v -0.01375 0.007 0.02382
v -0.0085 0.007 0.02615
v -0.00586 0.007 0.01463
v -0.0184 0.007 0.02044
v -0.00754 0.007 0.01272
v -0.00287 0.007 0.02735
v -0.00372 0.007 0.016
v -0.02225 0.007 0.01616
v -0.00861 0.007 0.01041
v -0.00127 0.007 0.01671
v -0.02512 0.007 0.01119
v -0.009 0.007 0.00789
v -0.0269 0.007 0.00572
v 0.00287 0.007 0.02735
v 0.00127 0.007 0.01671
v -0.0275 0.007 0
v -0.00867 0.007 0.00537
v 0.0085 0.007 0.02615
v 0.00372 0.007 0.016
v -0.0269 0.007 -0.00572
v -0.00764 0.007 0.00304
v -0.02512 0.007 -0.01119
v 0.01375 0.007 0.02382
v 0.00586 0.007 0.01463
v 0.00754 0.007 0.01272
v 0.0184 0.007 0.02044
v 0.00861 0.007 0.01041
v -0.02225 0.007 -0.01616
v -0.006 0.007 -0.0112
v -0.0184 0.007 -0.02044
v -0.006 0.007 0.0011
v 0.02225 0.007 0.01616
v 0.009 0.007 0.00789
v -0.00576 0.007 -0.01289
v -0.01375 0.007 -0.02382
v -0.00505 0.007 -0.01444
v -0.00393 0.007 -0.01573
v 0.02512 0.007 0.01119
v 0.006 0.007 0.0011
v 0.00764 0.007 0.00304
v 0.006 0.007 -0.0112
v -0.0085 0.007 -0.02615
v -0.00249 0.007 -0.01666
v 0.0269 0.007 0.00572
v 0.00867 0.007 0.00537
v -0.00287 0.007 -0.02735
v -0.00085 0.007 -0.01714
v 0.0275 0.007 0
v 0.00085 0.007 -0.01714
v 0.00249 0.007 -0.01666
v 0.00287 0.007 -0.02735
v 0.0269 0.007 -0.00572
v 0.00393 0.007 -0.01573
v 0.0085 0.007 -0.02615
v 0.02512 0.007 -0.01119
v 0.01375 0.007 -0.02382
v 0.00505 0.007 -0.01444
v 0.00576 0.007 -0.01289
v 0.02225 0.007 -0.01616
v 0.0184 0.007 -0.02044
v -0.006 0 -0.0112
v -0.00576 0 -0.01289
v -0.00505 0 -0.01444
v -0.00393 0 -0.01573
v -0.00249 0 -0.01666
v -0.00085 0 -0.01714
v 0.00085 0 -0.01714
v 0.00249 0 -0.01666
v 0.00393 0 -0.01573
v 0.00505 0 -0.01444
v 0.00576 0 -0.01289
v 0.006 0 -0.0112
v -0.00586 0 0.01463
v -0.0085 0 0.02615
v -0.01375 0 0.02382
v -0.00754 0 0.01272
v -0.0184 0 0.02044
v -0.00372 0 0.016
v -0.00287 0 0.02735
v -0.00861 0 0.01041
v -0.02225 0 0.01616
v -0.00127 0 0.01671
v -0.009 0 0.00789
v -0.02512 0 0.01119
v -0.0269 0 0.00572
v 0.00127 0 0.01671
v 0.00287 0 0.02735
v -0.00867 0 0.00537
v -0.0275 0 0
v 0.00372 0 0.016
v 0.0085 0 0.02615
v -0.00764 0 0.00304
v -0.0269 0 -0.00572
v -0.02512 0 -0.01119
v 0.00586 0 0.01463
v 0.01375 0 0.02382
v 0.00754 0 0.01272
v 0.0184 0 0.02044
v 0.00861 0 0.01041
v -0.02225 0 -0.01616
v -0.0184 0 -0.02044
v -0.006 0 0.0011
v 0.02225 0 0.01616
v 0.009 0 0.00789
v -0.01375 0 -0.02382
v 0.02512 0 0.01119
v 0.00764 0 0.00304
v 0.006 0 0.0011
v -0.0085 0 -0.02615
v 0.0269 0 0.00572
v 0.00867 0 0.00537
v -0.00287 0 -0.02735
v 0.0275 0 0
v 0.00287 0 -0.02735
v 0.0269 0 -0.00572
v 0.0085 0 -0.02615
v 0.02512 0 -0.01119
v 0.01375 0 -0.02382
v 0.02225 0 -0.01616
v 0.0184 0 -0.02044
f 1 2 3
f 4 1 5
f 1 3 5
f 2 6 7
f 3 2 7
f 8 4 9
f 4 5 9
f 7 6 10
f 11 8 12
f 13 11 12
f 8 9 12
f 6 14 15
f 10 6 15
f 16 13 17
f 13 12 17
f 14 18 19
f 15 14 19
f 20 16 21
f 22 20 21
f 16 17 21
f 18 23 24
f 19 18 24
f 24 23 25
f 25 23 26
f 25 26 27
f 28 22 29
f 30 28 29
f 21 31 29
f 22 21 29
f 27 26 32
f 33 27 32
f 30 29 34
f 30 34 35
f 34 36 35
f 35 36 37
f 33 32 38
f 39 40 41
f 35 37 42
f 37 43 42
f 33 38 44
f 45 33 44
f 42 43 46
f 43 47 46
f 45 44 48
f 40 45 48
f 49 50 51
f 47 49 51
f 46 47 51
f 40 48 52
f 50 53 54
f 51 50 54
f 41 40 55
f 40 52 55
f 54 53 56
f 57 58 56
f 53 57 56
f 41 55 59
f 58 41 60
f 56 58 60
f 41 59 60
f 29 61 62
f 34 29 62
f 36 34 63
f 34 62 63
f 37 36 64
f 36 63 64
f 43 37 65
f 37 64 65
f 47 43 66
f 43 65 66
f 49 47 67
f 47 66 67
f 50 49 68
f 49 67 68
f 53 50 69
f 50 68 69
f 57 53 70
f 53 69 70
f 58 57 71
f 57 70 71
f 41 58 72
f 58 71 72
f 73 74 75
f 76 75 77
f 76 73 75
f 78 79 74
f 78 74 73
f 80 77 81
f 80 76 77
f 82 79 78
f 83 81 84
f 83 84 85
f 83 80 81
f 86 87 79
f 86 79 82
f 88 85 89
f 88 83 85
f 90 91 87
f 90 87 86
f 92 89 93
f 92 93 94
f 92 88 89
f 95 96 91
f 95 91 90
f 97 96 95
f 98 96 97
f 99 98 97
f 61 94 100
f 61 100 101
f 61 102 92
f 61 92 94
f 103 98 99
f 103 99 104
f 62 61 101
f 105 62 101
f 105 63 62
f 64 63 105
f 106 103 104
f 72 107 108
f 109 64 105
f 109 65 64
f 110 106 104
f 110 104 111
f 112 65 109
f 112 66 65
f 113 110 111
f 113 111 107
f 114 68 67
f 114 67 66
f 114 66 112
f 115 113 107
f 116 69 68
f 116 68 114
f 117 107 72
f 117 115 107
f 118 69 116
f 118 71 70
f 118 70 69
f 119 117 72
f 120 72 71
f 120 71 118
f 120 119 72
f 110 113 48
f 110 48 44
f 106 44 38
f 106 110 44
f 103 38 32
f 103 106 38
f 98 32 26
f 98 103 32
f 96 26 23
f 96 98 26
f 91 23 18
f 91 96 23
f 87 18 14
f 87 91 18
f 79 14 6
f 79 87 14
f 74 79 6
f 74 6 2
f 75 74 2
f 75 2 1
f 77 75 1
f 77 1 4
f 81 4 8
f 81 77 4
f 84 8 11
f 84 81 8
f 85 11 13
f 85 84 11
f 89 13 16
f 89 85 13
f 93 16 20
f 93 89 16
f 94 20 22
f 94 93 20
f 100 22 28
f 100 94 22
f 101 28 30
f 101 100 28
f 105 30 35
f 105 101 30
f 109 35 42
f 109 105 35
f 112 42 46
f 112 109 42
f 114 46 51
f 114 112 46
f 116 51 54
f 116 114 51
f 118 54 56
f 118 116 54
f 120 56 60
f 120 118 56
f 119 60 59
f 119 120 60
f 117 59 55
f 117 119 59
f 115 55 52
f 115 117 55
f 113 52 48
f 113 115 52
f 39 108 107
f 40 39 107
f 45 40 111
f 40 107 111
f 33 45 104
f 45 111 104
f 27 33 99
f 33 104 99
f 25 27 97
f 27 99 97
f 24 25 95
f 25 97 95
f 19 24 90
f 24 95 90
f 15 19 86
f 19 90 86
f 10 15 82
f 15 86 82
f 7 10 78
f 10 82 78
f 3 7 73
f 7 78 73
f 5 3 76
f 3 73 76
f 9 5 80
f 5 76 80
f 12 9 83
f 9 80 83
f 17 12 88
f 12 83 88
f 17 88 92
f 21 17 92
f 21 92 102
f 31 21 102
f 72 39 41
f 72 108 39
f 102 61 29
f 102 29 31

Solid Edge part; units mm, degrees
sketch "Sketch1" plane through (0, 0, 0) normal (0, -1, 0) x (1, 0, 0)
  circle A0 centre (0, 0) radius 0.0275
  line L0 (0.006, 0.0011) -> (0.006, -0.0112)
  arc A1 (-0.006, 0.0011) -> (0.006, 0.0011) centre (0, 0.0078) cw
  line L1 (-0.006, -0.0112) -> (-0.006, 0.0011)
  arc A2 (0.006, -0.0112) -> (-0.006, -0.0112) centre (0, -0.0112) cw
extrude "Protrusion1" add sketch "Sketch1" against normal blind 0.007
